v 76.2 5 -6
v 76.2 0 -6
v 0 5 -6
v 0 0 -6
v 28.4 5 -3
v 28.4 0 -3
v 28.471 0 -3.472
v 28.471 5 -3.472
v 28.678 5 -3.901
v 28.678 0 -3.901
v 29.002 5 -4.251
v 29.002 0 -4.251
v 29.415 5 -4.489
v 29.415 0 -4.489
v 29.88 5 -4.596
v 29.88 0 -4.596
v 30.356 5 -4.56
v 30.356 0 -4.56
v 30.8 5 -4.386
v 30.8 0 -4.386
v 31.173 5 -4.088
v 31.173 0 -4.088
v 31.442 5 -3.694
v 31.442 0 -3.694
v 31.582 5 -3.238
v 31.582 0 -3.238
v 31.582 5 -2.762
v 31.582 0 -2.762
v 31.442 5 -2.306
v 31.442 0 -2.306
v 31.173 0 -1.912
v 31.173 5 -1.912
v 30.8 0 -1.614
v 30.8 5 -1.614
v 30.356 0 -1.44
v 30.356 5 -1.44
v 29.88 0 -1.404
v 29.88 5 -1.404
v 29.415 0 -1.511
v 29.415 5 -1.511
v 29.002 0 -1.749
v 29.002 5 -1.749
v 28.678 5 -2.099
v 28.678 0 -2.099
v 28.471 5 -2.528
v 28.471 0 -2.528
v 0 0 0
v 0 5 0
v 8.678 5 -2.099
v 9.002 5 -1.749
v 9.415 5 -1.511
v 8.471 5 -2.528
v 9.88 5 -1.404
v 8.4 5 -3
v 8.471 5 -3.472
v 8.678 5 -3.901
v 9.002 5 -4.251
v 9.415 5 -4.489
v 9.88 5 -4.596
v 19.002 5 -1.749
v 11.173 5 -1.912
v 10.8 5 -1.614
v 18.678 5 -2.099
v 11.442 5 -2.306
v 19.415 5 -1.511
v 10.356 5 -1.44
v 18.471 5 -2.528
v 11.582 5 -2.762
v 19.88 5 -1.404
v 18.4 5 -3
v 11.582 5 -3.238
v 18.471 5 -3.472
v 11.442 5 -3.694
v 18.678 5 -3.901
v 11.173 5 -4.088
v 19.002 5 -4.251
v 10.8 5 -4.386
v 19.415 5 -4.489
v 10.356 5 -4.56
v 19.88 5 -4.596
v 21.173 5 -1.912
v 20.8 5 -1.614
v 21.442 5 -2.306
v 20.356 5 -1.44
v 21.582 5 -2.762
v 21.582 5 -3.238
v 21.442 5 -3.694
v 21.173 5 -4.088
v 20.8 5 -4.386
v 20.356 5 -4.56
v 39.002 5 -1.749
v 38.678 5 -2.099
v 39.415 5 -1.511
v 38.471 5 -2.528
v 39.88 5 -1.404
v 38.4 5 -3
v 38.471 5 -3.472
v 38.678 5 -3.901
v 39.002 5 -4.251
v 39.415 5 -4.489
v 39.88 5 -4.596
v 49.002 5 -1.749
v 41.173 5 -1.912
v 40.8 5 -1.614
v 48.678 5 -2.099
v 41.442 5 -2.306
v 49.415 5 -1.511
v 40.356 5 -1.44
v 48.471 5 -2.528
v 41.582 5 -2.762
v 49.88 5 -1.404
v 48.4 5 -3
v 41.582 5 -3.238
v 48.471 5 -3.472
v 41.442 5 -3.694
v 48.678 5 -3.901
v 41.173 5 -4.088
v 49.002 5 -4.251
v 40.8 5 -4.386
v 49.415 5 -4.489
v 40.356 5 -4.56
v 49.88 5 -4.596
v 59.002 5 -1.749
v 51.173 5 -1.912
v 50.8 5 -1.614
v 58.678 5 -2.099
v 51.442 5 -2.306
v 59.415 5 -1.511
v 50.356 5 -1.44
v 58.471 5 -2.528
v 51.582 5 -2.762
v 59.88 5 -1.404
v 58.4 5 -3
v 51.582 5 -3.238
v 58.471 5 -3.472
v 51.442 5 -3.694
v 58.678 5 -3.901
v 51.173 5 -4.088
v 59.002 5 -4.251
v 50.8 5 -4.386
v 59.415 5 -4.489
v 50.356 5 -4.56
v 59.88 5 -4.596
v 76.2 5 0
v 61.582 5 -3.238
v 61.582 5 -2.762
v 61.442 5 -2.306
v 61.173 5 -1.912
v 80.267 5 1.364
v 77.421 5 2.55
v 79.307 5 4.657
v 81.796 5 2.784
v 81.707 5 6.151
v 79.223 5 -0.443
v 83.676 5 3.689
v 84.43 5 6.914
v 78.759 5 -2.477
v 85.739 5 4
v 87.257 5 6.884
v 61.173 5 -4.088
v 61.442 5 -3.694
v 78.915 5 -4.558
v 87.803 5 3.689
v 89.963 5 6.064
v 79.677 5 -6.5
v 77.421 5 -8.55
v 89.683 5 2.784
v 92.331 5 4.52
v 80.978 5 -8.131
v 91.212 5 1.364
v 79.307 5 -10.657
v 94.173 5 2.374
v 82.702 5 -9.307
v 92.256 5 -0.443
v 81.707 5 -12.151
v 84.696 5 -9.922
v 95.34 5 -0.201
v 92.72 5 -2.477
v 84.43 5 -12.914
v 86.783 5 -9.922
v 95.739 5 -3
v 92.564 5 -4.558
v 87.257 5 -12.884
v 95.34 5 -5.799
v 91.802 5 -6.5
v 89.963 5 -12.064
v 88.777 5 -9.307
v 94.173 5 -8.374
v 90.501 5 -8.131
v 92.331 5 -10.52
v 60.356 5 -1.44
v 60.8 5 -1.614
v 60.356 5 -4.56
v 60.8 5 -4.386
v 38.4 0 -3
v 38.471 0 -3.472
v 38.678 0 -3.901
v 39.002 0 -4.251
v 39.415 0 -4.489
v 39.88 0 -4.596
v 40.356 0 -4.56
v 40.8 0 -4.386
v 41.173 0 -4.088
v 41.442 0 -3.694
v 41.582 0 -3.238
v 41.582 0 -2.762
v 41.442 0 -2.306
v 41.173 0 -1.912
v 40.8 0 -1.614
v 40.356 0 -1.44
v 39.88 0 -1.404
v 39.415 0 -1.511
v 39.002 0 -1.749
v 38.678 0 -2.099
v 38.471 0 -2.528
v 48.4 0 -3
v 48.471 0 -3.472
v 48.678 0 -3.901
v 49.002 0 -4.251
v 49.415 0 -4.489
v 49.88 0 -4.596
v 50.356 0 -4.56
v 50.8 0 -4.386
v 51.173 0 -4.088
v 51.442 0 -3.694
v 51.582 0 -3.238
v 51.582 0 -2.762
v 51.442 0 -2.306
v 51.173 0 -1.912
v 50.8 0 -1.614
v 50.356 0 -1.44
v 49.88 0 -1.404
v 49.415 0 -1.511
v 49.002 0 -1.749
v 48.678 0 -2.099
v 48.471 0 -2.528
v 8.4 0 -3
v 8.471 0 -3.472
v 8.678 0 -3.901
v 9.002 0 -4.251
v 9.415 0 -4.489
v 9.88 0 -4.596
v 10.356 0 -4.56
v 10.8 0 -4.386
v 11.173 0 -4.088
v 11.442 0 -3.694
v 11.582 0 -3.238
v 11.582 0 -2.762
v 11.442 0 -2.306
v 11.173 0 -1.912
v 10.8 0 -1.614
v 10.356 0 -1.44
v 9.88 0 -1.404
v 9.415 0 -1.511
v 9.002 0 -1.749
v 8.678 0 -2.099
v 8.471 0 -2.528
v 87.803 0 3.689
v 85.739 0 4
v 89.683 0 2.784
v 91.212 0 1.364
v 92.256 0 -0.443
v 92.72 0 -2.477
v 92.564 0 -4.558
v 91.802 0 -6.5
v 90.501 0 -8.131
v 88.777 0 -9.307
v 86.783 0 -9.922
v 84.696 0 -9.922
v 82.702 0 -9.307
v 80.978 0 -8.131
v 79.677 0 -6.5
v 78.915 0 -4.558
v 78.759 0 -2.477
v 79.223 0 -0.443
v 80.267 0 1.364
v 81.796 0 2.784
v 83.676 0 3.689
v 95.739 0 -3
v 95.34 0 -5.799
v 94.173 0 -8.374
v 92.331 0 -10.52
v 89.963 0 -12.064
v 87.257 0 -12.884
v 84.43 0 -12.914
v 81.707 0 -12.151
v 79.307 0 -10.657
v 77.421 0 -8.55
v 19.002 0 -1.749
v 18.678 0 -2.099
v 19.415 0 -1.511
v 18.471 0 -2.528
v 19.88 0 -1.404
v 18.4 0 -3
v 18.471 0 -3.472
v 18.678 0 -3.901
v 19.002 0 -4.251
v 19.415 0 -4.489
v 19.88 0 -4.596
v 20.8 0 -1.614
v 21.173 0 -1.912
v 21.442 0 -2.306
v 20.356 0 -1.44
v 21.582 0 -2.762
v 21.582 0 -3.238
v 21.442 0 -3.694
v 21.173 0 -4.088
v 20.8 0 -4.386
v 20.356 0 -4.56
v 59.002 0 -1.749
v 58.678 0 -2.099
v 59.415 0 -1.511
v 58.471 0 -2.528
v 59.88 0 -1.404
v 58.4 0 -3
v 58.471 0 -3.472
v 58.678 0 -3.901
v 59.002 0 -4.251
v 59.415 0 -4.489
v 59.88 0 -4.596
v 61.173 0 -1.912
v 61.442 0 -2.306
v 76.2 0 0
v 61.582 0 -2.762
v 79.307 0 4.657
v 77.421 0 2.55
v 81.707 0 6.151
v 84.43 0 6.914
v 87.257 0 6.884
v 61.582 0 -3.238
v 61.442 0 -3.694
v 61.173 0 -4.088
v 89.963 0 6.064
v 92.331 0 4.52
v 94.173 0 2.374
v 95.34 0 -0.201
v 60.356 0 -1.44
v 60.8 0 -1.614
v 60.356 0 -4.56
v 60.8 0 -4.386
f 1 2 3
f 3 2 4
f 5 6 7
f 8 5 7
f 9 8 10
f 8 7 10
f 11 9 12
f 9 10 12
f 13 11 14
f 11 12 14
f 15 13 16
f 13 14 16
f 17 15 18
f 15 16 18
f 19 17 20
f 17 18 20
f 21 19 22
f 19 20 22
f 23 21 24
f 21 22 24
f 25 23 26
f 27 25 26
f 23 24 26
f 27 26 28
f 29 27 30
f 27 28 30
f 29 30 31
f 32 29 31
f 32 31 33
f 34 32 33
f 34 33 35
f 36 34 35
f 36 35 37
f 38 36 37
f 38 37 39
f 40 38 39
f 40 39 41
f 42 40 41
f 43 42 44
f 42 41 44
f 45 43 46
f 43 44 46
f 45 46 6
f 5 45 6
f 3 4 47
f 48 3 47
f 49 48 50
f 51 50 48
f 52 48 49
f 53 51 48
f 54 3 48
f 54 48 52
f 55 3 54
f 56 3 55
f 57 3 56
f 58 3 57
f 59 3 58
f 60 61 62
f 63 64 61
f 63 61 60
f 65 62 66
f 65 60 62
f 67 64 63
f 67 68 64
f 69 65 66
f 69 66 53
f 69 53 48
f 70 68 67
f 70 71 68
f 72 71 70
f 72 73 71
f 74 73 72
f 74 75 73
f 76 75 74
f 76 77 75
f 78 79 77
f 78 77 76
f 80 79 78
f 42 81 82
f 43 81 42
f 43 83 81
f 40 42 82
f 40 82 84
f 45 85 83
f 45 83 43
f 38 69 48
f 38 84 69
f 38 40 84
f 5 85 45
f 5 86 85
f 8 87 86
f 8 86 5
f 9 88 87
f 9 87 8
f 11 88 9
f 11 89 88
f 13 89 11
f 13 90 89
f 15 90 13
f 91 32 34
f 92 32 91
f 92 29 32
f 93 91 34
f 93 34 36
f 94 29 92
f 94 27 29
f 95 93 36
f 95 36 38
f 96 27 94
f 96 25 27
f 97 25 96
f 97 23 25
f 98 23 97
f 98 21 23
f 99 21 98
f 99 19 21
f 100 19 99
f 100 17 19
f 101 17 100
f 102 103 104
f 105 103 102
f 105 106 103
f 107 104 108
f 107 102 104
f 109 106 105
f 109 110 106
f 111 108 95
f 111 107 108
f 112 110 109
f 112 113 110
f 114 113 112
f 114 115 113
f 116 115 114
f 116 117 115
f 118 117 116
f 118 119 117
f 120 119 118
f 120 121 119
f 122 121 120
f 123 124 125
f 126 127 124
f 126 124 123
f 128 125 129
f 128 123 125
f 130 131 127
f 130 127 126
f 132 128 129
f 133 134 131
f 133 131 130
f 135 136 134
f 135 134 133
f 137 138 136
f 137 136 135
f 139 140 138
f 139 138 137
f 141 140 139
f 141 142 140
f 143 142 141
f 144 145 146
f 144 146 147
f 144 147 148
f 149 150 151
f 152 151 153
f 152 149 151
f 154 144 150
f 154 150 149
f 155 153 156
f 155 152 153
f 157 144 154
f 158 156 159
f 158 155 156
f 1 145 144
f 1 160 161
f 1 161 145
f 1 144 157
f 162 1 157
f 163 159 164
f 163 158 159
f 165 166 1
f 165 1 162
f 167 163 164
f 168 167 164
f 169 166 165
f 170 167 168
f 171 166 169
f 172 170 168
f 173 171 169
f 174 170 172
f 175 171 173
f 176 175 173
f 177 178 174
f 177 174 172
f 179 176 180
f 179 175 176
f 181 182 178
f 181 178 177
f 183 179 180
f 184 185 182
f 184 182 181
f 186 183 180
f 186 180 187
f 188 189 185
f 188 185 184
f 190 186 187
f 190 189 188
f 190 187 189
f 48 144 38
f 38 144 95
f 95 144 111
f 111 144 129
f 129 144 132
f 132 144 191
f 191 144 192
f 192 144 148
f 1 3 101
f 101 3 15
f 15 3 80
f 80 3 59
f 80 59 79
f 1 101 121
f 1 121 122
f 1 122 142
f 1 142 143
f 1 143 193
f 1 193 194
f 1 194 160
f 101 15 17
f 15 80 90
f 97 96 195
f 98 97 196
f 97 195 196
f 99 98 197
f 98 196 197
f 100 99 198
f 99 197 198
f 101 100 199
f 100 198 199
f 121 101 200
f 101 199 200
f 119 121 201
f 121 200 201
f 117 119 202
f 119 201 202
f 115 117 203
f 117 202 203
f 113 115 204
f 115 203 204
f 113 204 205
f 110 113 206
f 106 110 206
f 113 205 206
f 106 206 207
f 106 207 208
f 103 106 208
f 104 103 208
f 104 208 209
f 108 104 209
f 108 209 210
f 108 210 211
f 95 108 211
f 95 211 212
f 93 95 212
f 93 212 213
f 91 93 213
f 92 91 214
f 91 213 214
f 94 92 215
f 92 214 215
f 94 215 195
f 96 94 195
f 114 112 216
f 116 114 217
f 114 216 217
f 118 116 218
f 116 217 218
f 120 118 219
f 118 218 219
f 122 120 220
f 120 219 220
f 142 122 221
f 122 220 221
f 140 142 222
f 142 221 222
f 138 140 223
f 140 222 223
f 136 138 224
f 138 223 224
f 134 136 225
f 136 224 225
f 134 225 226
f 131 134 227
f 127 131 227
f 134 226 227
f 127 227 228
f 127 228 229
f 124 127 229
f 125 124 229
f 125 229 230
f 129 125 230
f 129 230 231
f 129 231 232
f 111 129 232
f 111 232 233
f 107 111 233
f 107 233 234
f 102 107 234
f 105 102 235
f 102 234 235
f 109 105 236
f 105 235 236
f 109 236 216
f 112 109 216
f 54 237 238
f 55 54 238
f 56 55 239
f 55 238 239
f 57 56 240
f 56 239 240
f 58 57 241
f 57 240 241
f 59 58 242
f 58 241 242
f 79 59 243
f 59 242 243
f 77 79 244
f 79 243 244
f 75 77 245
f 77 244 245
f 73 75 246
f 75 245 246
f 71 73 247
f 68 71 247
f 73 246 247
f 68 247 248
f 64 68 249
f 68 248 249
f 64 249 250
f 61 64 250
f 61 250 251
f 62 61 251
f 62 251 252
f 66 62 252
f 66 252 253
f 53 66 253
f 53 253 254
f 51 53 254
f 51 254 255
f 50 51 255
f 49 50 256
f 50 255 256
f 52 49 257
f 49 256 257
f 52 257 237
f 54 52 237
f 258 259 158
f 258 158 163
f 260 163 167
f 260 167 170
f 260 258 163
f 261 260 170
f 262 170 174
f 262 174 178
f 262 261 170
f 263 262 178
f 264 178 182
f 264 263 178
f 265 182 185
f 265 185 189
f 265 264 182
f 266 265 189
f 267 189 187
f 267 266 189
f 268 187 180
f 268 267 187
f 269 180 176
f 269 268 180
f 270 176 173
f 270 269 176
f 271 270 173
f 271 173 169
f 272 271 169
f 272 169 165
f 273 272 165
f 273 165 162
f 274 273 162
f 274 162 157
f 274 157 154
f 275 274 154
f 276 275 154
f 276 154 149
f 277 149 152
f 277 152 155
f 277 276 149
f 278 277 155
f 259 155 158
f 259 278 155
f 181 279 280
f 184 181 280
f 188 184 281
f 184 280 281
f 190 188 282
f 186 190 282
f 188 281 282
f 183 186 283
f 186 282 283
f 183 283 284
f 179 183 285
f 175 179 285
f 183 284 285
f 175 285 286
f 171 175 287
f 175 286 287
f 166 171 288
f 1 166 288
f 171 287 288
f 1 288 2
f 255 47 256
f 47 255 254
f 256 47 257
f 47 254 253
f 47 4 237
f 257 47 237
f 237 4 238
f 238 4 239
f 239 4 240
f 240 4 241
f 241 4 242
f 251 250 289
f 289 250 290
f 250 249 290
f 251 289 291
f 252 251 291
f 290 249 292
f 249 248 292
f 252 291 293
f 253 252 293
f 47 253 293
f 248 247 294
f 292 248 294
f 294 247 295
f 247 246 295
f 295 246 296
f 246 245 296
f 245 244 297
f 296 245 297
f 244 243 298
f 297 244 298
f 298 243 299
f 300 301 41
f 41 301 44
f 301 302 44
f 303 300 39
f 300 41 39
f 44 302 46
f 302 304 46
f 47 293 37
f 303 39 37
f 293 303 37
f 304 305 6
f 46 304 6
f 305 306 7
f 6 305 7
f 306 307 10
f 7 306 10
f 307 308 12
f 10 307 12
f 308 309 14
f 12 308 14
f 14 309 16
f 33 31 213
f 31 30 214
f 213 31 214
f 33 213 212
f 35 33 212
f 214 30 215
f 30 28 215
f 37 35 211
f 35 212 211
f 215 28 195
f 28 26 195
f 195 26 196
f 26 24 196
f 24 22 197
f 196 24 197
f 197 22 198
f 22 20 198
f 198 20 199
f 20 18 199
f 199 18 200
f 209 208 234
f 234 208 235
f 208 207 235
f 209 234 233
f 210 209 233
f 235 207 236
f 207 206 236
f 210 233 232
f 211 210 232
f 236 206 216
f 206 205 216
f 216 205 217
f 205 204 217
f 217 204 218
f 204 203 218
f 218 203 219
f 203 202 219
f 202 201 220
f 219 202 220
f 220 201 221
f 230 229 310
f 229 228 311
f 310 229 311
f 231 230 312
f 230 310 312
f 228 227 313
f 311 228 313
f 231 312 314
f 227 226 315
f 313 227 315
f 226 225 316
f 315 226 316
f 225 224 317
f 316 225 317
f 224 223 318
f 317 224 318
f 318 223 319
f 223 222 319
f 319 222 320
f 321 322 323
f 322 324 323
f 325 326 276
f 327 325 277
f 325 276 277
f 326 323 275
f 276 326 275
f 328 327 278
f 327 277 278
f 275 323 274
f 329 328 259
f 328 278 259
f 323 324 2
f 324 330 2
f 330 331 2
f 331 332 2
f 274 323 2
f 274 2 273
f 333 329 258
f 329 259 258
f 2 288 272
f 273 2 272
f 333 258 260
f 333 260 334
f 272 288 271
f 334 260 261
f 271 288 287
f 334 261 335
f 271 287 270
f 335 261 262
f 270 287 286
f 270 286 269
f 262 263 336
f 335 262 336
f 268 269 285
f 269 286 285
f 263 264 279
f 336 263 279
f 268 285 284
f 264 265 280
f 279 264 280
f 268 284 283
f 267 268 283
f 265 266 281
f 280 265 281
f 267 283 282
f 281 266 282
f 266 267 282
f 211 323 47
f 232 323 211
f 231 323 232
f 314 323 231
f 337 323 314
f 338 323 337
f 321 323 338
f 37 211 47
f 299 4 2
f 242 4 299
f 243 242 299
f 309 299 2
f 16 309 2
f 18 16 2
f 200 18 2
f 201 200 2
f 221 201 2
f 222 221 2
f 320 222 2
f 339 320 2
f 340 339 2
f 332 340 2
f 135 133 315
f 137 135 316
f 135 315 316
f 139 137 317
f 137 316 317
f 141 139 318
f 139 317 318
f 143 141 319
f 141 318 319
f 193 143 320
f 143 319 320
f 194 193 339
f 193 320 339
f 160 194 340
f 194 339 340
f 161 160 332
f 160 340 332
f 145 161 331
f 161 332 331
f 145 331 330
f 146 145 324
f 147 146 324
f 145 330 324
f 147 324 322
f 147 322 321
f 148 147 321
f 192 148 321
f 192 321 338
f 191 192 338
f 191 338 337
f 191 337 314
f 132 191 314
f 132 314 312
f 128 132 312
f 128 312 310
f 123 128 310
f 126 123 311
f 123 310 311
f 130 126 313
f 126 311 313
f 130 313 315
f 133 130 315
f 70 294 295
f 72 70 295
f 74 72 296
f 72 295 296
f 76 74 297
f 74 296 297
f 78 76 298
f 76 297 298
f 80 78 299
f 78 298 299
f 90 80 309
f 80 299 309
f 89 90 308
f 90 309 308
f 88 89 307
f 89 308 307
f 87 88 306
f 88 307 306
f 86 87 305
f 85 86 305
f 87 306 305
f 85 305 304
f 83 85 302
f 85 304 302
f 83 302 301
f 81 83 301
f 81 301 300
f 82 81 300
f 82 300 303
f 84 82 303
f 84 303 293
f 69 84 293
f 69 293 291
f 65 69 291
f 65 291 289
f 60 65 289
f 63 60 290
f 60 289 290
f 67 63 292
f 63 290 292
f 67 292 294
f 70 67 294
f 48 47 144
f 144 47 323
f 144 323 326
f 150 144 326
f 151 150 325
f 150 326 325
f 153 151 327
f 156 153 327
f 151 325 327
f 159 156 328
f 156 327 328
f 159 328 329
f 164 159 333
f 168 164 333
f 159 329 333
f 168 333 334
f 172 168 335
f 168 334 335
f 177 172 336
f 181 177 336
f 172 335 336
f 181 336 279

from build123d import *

# Parameters (mm, degrees)
SKETCH1_R           = 7
BOSS_EXTRUDE1_DEPTH = 5


with BuildPart() as part:
    # Sketch1 → Boss-Extrude1 (new body)
    # profile 1 of 7: a face of its own
    with BuildSketch(Plane(origin=(0, 0, 0), x_dir=(1, 0, 0), z_dir=(0, 1, 0))):
        with BuildLine():
            Line((76.2, 3), (76.2, 0))
            ThreePointArc((76.2, 0), (87.256969007, -6.884177258), (95.739392014, 3))
            ThreePointArc((95.739392014, 3), (87.256969007, 12.884177258), (76.2, 6))
            Line((76.2, 6), (76.2, 3))
        make_face()
        with Locations(Location((85.739392014, 3, 0), (0, 0, 270))):
            Circle(SKETCH1_R, mode=Mode.SUBTRACT)
    # profile 2 of 7: a face of its own
    with BuildSketch(Plane(origin=(0, 0, 0), x_dir=(1, 0, 0), z_dir=(0, 1, 0))):
        with BuildLine():
            ThreePointArc((75.739392014, 3), (75.855214756, 1.482423007), (76.2, 0))
            Line((76.2, 0), (76.2, 3))
            Line((76.2, 3), (75.739392014, 3))
        make_face()
    # profile 3 of 7: a face of its own
    with BuildSketch(Plane(origin=(0, 0, 0), x_dir=(1, 0, 0), z_dir=(0, 1, 0))):
        with BuildLine():
            Line((76.2, 3), (76.2, 6))
            ThreePointArc((76.2, 6), (75.855214756, 4.517576993), (75.739392014, 3))
            Line((75.739392014, 3), (76.2, 3))
        make_face()
    # profile 4 of 7: a face of its own
    with BuildSketch(Plane(origin=(0, 0, 0), x_dir=(1, 0, 0), z_dir=(0, 1, 0))):
        with BuildLine():
            ThreePointArc((75.739392014, 3), (75.855214756, 1.482423007), (76.2, 0))
            Line((76.2, 0), (76.2, 3))
            Line((76.2, 3), (75.739392014, 3))
        make_face()
    # profile 5 of 7: a face of its own
    with BuildSketch(Plane(origin=(0, 0, 0), x_dir=(1, 0, 0), z_dir=(0, 1, 0))):
        with BuildLine():
            Line((76.2, 3), (76.2, 6))
            ThreePointArc((76.2, 6), (75.855214756, 4.517576993), (75.739392014, 3))
            Line((75.739392014, 3), (76.2, 3))
        make_face()
    # profile 6 of 7: a face of its own
    with BuildSketch(Plane(origin=(0, 0, 0), x_dir=(1, 0, 0), z_dir=(0, 1, 0))):
        with BuildLine():
            Line((8.4, 3), (0, 3))
            Line((0, 3), (0, 0))
            Line((0, 0), (76.2, 0))
            ThreePointArc((76.2, 0), (75.855214756, 1.482423007), (75.739392014, 3))
            Line((75.739392014, 3), (61.6, 3))
            ThreePointArc((61.6, 3), (60, 1.4), (58.4, 3))
            Line((58.4, 3), (51.6, 3))
            ThreePointArc((51.6, 3), (50, 1.4), (48.4, 3))
            Line((48.4, 3), (41.6, 3))
            ThreePointArc((41.6, 3), (40, 1.4), (38.4, 3))
            Line((38.4, 3), (31.6, 3))
            ThreePointArc((31.6, 3), (30, 1.4), (28.4, 3))
            Line((28.4, 3), (21.6, 3))
            ThreePointArc((21.6, 3), (20, 1.4), (18.4, 3))
            Line((18.4, 3), (11.6, 3))
            ThreePointArc((11.6, 3), (10, 1.4), (8.4, 3))
        make_face()
    # profile 7 of 7: a face of its own
    with BuildSketch(Plane(origin=(0, 0, 0), x_dir=(1, 0, 0), z_dir=(0, 1, 0))):
        with BuildLine():
            Line((0, 6), (0, 3))
            Line((0, 3), (8.4, 3))
            ThreePointArc((8.4, 3), (10, 4.6), (11.6, 3))
            Line((11.6, 3), (18.4, 3))
            ThreePointArc((18.4, 3), (20, 4.6), (21.6, 3))
            Line((21.6, 3), (28.4, 3))
            ThreePointArc((28.4, 3), (30, 4.6), (31.6, 3))
            Line((31.6, 3), (38.4, 3))
            ThreePointArc((38.4, 3), (40, 4.6), (41.6, 3))
            Line((41.6, 3), (48.4, 3))
            ThreePointArc((48.4, 3), (50, 4.6), (51.6, 3))
            Line((51.6, 3), (58.4, 3))
            ThreePointArc((58.4, 3), (60, 4.6), (61.6, 3))
            Line((61.6, 3), (75.739392014, 3))
            ThreePointArc((75.739392014, 3), (75.855214756, 4.517576993), (76.2, 6))
            Line((76.2, 6), (0, 6))
        make_face()
    extrude(amount=BOSS_EXTRUDE1_DEPTH)


solid = part.part
